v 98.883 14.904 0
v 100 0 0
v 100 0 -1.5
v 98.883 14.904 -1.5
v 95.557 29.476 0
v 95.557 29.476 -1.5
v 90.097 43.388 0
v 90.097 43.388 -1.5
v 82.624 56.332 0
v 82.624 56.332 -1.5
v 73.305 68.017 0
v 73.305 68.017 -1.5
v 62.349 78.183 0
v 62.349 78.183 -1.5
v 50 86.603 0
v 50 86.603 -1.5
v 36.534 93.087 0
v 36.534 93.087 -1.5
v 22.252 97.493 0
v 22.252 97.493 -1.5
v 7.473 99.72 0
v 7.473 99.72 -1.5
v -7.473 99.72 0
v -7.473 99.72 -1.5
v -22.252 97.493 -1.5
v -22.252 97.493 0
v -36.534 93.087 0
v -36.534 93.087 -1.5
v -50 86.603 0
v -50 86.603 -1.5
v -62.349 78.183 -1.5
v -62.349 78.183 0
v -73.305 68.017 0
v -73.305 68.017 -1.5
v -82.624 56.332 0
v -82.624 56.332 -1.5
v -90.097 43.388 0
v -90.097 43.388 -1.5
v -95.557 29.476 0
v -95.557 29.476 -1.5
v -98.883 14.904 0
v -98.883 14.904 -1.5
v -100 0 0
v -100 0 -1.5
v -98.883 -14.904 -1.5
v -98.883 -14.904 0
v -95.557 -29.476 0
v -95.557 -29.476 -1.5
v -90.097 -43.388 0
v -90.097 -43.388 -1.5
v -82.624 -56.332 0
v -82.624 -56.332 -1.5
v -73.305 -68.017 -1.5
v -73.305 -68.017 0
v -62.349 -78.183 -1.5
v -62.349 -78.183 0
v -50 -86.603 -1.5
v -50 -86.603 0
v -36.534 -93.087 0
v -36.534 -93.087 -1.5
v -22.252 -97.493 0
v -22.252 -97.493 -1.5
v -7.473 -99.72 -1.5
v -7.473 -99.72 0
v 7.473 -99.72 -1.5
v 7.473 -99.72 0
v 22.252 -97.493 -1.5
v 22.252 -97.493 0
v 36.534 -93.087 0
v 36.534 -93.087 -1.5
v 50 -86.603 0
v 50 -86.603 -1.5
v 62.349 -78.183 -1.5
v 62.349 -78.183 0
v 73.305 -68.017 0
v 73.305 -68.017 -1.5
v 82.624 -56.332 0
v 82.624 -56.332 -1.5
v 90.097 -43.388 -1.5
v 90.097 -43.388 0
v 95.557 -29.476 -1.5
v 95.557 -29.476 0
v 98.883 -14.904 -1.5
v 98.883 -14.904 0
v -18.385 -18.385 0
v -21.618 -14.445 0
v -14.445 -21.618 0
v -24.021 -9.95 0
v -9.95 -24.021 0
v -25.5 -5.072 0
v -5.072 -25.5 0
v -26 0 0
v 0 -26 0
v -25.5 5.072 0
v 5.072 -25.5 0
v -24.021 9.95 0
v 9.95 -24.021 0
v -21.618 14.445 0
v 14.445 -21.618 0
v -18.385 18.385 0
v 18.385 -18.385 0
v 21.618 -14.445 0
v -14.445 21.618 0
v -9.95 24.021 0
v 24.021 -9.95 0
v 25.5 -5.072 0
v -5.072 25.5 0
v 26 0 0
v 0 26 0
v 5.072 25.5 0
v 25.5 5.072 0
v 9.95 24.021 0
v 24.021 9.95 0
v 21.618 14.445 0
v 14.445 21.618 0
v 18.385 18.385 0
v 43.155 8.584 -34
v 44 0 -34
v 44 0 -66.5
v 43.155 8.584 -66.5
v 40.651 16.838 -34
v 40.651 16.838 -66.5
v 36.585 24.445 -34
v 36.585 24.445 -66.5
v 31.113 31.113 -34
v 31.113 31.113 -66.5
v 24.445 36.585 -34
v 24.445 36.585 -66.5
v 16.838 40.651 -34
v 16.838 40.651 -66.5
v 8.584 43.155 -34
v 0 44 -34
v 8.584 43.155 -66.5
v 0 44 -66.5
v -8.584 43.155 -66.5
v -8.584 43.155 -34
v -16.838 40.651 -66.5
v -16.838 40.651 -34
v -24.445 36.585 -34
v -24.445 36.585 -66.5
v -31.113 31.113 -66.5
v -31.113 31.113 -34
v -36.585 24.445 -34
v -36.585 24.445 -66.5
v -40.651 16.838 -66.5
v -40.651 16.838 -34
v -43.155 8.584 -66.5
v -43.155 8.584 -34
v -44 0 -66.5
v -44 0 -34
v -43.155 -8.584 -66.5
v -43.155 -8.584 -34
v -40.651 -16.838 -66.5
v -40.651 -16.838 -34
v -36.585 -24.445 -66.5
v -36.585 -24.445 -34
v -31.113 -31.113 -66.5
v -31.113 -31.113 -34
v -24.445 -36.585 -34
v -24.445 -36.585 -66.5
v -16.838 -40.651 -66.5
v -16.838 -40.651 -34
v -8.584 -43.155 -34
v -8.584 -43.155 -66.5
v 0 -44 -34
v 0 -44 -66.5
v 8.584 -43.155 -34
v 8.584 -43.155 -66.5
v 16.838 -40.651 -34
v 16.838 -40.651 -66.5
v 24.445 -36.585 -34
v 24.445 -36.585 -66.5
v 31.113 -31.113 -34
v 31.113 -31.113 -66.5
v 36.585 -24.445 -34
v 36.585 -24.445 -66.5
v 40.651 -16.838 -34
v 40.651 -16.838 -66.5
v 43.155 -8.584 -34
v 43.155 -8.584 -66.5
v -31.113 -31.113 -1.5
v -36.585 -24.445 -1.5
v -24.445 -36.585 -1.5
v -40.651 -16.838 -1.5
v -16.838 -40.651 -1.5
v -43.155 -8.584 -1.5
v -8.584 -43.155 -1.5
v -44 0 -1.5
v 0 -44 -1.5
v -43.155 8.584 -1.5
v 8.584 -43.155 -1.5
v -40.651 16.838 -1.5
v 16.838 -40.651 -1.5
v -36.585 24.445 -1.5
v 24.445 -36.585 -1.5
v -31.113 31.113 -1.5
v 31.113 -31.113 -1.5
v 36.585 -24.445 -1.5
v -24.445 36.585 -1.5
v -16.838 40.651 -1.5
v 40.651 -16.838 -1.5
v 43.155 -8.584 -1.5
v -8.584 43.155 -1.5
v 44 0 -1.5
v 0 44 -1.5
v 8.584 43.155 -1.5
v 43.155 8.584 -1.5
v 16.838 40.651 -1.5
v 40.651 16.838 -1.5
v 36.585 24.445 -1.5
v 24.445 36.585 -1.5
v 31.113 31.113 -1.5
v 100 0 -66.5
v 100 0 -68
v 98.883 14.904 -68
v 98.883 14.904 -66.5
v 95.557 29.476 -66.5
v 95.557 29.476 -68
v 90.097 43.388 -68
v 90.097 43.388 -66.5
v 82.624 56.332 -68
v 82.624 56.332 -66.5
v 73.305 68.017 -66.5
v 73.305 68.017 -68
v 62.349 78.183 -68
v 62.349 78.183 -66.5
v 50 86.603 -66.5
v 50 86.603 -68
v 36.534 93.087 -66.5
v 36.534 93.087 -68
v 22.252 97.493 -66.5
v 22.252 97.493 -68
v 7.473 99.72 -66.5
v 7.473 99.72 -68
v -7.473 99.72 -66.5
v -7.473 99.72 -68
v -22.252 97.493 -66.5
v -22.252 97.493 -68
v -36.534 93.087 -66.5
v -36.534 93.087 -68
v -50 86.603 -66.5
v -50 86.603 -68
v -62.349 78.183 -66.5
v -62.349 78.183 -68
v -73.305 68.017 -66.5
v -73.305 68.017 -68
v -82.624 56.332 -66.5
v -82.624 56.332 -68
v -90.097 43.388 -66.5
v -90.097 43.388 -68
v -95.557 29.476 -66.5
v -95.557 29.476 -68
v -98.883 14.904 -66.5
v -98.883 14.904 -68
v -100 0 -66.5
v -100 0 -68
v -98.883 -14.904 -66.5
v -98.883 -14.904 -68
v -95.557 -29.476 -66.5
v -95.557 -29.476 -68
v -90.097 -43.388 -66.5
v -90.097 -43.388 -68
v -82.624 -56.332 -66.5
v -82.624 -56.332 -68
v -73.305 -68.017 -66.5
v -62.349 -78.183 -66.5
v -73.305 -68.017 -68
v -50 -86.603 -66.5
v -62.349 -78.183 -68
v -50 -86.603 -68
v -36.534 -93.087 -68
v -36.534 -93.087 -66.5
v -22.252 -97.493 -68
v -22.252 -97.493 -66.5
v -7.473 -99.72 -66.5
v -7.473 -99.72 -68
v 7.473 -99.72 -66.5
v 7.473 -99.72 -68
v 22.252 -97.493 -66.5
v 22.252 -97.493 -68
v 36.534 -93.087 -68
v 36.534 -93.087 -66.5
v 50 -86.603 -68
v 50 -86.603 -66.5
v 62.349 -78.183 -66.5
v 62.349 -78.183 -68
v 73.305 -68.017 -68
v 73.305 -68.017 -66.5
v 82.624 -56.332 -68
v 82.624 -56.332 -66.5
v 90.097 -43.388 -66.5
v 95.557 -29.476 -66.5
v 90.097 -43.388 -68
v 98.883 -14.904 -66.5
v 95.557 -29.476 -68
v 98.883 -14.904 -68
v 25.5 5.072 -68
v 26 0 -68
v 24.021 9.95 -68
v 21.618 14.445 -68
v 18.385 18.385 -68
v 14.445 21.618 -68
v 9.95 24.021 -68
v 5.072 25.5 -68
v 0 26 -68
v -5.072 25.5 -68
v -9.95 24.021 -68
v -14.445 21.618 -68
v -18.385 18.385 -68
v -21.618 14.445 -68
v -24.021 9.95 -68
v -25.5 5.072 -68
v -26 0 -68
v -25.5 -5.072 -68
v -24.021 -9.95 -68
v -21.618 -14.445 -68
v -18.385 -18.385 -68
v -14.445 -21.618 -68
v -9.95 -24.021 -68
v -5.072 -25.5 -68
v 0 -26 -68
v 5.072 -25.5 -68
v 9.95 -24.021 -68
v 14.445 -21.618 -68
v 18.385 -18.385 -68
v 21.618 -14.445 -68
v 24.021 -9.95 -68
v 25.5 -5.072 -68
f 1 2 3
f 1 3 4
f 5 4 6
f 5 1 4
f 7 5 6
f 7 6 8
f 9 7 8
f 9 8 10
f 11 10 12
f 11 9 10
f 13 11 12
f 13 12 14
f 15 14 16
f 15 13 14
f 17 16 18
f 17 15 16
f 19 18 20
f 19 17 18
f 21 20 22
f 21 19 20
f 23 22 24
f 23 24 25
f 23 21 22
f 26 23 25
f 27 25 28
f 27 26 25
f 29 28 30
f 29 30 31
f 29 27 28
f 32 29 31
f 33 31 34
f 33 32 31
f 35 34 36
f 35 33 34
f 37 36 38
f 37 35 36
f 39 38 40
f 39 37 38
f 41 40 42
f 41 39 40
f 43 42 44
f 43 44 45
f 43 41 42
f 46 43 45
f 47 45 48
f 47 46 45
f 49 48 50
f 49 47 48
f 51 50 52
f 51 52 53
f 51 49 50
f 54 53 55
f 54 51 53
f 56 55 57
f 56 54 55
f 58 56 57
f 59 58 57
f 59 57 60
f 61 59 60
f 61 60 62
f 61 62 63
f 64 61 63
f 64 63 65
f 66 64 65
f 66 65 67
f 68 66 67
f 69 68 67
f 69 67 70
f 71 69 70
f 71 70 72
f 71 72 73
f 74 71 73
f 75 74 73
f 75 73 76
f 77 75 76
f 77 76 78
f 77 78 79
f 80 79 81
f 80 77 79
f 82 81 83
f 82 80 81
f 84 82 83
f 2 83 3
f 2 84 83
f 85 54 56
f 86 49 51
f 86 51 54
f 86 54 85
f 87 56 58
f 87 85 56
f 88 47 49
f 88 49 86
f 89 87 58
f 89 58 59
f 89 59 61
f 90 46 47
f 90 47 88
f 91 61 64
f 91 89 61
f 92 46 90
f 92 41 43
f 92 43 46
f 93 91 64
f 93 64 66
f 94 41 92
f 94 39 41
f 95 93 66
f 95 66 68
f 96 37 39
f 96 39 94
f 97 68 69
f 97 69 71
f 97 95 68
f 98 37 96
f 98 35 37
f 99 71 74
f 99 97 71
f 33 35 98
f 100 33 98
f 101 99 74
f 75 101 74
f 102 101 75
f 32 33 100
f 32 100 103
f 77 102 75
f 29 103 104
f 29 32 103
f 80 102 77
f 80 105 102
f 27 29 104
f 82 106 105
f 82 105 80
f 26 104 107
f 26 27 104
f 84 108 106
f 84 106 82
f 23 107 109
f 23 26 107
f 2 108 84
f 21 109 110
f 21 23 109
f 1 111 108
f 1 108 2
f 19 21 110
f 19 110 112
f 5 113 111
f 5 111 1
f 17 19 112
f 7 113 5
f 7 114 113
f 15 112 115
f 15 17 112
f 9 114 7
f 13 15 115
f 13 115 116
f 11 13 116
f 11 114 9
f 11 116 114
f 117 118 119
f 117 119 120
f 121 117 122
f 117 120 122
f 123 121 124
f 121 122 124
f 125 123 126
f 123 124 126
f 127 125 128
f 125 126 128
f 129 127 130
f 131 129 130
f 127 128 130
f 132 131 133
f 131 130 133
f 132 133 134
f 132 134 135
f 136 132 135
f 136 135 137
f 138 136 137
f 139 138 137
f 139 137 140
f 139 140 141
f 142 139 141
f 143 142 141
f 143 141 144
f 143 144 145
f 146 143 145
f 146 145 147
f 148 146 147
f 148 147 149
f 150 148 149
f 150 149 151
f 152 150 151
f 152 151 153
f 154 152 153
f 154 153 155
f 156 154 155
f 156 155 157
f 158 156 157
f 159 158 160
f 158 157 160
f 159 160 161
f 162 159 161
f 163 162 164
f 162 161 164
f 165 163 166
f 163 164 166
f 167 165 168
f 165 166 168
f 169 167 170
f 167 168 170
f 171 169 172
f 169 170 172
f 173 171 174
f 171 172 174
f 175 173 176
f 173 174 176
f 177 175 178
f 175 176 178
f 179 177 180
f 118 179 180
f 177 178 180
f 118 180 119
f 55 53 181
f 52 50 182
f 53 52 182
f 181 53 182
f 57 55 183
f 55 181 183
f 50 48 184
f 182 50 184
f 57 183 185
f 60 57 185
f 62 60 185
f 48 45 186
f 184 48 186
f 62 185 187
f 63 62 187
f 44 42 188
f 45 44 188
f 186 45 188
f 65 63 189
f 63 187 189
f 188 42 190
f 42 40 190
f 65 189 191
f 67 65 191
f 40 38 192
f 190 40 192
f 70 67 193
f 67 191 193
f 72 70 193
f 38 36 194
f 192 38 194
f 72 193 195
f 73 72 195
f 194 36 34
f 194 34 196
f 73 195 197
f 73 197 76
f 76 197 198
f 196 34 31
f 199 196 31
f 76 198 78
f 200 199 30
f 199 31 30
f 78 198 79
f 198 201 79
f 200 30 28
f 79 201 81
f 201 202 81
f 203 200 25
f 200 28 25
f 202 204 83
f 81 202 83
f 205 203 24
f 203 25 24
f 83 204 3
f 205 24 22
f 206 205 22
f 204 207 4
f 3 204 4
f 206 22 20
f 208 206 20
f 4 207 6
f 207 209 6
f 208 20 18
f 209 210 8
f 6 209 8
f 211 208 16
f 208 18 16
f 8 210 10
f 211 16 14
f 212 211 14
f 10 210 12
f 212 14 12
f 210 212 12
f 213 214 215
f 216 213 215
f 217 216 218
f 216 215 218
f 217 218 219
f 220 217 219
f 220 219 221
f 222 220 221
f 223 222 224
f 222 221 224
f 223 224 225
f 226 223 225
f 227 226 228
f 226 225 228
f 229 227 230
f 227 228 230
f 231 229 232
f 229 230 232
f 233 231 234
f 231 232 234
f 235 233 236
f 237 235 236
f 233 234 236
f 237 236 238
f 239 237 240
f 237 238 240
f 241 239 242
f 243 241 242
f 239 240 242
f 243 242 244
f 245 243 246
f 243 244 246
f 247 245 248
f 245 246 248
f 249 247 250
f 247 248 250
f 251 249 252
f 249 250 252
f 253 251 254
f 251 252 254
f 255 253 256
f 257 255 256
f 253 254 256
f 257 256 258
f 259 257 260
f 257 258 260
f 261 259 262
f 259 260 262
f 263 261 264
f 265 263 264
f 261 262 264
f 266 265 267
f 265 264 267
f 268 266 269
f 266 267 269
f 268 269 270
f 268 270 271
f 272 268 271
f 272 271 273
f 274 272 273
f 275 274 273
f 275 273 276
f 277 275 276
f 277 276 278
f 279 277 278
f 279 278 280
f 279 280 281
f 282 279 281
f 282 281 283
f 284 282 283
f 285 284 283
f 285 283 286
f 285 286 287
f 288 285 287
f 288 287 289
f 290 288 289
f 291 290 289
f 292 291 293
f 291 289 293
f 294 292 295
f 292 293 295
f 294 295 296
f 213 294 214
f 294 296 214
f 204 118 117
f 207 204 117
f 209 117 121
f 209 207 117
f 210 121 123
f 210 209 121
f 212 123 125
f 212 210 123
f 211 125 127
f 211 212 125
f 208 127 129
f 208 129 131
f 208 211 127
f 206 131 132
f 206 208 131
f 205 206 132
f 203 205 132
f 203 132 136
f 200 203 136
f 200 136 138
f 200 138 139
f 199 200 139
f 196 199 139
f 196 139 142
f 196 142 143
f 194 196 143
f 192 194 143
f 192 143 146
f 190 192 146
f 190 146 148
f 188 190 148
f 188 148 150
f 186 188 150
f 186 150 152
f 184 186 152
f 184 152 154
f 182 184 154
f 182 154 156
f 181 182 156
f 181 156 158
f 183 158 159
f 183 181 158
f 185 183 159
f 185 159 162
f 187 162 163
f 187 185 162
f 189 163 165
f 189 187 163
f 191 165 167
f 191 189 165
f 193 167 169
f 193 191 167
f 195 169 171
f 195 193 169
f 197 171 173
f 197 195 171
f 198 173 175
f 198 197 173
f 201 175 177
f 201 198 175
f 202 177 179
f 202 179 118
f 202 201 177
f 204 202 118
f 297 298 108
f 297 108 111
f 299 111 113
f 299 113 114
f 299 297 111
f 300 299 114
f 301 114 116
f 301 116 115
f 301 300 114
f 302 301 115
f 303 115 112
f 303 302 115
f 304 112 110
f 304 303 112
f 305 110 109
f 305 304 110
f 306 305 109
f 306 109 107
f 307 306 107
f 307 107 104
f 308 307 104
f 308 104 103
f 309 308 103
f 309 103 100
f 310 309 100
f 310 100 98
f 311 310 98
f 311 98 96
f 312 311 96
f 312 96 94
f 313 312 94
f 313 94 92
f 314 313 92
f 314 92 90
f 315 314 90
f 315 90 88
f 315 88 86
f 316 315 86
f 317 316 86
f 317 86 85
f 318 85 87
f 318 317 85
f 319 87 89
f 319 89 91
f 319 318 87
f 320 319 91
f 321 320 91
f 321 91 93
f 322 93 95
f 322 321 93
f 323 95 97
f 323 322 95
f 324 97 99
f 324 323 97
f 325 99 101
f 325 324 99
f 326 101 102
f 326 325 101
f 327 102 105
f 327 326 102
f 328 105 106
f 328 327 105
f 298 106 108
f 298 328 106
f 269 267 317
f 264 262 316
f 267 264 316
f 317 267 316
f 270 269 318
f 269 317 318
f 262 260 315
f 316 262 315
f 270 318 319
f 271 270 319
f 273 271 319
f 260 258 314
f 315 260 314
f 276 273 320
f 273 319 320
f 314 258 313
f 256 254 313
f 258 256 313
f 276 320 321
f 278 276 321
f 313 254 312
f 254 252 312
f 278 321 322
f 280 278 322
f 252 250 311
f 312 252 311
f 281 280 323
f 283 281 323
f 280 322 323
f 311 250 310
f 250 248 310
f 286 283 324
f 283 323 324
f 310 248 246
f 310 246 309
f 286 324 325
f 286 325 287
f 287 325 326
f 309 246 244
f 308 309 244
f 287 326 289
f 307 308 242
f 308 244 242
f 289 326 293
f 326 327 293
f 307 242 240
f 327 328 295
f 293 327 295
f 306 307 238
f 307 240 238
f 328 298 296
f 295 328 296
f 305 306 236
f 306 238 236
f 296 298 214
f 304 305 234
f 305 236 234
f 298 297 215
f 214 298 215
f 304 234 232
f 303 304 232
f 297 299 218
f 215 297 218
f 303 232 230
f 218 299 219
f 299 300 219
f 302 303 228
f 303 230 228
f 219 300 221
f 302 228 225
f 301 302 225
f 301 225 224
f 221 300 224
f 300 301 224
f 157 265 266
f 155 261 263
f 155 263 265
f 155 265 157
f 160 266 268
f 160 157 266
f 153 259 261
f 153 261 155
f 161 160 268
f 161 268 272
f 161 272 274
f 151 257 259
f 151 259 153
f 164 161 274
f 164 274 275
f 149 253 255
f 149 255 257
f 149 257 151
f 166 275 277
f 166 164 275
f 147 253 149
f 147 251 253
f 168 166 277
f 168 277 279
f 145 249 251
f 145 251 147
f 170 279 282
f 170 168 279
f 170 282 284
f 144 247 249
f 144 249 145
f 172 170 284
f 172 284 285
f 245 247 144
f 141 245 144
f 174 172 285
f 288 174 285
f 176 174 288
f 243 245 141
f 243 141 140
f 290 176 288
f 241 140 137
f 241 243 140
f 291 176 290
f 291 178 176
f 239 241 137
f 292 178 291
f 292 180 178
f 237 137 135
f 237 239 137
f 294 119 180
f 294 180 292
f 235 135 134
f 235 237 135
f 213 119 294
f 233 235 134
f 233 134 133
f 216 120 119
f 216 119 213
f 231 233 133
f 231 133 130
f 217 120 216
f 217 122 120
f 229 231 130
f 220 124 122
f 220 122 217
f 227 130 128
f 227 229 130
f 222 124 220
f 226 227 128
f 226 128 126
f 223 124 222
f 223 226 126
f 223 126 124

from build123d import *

# Parameters (mm, degrees)
ESBO_O1_R                = 100
ESBO_O1_R_2              = 26
RESSALTO_EXTRUS_O1_DEPTH = 1.5
ESBO_O1_3_R              = 44
ESBO_O1_3_R_2            = 26
RESSALTO_EXTRUS_O2_DEPTH = 34


with BuildPart() as part:
    # Esboço1 → Ressalto-extrusão1 (new body)
    with BuildSketch(Plane.XY):
        Circle(ESBO_O1_R)
        Circle(ESBO_O1_R_2, mode=Mode.SUBTRACT)
    extrude(amount=-RESSALTO_EXTRUS_O1_DEPTH)

    # Esboço1<3> → Ressalto-extrusão2 (add)
    with BuildSketch(Plane.XY):
        Circle(ESBO_O1_3_R)
        Circle(ESBO_O1_3_R_2, mode=Mode.SUBTRACT)
    extrude(amount=-RESSALTO_EXTRUS_O2_DEPTH)

    # Espelhar1: part across plane


with BuildPart() as part_1:
    add(part.part)
    add(part.part.mirror(Plane(origin=(0, 0, -34), x_dir=(1, 0, 0), z_dir=(0, 0, -1))))


solid = part_1.part
